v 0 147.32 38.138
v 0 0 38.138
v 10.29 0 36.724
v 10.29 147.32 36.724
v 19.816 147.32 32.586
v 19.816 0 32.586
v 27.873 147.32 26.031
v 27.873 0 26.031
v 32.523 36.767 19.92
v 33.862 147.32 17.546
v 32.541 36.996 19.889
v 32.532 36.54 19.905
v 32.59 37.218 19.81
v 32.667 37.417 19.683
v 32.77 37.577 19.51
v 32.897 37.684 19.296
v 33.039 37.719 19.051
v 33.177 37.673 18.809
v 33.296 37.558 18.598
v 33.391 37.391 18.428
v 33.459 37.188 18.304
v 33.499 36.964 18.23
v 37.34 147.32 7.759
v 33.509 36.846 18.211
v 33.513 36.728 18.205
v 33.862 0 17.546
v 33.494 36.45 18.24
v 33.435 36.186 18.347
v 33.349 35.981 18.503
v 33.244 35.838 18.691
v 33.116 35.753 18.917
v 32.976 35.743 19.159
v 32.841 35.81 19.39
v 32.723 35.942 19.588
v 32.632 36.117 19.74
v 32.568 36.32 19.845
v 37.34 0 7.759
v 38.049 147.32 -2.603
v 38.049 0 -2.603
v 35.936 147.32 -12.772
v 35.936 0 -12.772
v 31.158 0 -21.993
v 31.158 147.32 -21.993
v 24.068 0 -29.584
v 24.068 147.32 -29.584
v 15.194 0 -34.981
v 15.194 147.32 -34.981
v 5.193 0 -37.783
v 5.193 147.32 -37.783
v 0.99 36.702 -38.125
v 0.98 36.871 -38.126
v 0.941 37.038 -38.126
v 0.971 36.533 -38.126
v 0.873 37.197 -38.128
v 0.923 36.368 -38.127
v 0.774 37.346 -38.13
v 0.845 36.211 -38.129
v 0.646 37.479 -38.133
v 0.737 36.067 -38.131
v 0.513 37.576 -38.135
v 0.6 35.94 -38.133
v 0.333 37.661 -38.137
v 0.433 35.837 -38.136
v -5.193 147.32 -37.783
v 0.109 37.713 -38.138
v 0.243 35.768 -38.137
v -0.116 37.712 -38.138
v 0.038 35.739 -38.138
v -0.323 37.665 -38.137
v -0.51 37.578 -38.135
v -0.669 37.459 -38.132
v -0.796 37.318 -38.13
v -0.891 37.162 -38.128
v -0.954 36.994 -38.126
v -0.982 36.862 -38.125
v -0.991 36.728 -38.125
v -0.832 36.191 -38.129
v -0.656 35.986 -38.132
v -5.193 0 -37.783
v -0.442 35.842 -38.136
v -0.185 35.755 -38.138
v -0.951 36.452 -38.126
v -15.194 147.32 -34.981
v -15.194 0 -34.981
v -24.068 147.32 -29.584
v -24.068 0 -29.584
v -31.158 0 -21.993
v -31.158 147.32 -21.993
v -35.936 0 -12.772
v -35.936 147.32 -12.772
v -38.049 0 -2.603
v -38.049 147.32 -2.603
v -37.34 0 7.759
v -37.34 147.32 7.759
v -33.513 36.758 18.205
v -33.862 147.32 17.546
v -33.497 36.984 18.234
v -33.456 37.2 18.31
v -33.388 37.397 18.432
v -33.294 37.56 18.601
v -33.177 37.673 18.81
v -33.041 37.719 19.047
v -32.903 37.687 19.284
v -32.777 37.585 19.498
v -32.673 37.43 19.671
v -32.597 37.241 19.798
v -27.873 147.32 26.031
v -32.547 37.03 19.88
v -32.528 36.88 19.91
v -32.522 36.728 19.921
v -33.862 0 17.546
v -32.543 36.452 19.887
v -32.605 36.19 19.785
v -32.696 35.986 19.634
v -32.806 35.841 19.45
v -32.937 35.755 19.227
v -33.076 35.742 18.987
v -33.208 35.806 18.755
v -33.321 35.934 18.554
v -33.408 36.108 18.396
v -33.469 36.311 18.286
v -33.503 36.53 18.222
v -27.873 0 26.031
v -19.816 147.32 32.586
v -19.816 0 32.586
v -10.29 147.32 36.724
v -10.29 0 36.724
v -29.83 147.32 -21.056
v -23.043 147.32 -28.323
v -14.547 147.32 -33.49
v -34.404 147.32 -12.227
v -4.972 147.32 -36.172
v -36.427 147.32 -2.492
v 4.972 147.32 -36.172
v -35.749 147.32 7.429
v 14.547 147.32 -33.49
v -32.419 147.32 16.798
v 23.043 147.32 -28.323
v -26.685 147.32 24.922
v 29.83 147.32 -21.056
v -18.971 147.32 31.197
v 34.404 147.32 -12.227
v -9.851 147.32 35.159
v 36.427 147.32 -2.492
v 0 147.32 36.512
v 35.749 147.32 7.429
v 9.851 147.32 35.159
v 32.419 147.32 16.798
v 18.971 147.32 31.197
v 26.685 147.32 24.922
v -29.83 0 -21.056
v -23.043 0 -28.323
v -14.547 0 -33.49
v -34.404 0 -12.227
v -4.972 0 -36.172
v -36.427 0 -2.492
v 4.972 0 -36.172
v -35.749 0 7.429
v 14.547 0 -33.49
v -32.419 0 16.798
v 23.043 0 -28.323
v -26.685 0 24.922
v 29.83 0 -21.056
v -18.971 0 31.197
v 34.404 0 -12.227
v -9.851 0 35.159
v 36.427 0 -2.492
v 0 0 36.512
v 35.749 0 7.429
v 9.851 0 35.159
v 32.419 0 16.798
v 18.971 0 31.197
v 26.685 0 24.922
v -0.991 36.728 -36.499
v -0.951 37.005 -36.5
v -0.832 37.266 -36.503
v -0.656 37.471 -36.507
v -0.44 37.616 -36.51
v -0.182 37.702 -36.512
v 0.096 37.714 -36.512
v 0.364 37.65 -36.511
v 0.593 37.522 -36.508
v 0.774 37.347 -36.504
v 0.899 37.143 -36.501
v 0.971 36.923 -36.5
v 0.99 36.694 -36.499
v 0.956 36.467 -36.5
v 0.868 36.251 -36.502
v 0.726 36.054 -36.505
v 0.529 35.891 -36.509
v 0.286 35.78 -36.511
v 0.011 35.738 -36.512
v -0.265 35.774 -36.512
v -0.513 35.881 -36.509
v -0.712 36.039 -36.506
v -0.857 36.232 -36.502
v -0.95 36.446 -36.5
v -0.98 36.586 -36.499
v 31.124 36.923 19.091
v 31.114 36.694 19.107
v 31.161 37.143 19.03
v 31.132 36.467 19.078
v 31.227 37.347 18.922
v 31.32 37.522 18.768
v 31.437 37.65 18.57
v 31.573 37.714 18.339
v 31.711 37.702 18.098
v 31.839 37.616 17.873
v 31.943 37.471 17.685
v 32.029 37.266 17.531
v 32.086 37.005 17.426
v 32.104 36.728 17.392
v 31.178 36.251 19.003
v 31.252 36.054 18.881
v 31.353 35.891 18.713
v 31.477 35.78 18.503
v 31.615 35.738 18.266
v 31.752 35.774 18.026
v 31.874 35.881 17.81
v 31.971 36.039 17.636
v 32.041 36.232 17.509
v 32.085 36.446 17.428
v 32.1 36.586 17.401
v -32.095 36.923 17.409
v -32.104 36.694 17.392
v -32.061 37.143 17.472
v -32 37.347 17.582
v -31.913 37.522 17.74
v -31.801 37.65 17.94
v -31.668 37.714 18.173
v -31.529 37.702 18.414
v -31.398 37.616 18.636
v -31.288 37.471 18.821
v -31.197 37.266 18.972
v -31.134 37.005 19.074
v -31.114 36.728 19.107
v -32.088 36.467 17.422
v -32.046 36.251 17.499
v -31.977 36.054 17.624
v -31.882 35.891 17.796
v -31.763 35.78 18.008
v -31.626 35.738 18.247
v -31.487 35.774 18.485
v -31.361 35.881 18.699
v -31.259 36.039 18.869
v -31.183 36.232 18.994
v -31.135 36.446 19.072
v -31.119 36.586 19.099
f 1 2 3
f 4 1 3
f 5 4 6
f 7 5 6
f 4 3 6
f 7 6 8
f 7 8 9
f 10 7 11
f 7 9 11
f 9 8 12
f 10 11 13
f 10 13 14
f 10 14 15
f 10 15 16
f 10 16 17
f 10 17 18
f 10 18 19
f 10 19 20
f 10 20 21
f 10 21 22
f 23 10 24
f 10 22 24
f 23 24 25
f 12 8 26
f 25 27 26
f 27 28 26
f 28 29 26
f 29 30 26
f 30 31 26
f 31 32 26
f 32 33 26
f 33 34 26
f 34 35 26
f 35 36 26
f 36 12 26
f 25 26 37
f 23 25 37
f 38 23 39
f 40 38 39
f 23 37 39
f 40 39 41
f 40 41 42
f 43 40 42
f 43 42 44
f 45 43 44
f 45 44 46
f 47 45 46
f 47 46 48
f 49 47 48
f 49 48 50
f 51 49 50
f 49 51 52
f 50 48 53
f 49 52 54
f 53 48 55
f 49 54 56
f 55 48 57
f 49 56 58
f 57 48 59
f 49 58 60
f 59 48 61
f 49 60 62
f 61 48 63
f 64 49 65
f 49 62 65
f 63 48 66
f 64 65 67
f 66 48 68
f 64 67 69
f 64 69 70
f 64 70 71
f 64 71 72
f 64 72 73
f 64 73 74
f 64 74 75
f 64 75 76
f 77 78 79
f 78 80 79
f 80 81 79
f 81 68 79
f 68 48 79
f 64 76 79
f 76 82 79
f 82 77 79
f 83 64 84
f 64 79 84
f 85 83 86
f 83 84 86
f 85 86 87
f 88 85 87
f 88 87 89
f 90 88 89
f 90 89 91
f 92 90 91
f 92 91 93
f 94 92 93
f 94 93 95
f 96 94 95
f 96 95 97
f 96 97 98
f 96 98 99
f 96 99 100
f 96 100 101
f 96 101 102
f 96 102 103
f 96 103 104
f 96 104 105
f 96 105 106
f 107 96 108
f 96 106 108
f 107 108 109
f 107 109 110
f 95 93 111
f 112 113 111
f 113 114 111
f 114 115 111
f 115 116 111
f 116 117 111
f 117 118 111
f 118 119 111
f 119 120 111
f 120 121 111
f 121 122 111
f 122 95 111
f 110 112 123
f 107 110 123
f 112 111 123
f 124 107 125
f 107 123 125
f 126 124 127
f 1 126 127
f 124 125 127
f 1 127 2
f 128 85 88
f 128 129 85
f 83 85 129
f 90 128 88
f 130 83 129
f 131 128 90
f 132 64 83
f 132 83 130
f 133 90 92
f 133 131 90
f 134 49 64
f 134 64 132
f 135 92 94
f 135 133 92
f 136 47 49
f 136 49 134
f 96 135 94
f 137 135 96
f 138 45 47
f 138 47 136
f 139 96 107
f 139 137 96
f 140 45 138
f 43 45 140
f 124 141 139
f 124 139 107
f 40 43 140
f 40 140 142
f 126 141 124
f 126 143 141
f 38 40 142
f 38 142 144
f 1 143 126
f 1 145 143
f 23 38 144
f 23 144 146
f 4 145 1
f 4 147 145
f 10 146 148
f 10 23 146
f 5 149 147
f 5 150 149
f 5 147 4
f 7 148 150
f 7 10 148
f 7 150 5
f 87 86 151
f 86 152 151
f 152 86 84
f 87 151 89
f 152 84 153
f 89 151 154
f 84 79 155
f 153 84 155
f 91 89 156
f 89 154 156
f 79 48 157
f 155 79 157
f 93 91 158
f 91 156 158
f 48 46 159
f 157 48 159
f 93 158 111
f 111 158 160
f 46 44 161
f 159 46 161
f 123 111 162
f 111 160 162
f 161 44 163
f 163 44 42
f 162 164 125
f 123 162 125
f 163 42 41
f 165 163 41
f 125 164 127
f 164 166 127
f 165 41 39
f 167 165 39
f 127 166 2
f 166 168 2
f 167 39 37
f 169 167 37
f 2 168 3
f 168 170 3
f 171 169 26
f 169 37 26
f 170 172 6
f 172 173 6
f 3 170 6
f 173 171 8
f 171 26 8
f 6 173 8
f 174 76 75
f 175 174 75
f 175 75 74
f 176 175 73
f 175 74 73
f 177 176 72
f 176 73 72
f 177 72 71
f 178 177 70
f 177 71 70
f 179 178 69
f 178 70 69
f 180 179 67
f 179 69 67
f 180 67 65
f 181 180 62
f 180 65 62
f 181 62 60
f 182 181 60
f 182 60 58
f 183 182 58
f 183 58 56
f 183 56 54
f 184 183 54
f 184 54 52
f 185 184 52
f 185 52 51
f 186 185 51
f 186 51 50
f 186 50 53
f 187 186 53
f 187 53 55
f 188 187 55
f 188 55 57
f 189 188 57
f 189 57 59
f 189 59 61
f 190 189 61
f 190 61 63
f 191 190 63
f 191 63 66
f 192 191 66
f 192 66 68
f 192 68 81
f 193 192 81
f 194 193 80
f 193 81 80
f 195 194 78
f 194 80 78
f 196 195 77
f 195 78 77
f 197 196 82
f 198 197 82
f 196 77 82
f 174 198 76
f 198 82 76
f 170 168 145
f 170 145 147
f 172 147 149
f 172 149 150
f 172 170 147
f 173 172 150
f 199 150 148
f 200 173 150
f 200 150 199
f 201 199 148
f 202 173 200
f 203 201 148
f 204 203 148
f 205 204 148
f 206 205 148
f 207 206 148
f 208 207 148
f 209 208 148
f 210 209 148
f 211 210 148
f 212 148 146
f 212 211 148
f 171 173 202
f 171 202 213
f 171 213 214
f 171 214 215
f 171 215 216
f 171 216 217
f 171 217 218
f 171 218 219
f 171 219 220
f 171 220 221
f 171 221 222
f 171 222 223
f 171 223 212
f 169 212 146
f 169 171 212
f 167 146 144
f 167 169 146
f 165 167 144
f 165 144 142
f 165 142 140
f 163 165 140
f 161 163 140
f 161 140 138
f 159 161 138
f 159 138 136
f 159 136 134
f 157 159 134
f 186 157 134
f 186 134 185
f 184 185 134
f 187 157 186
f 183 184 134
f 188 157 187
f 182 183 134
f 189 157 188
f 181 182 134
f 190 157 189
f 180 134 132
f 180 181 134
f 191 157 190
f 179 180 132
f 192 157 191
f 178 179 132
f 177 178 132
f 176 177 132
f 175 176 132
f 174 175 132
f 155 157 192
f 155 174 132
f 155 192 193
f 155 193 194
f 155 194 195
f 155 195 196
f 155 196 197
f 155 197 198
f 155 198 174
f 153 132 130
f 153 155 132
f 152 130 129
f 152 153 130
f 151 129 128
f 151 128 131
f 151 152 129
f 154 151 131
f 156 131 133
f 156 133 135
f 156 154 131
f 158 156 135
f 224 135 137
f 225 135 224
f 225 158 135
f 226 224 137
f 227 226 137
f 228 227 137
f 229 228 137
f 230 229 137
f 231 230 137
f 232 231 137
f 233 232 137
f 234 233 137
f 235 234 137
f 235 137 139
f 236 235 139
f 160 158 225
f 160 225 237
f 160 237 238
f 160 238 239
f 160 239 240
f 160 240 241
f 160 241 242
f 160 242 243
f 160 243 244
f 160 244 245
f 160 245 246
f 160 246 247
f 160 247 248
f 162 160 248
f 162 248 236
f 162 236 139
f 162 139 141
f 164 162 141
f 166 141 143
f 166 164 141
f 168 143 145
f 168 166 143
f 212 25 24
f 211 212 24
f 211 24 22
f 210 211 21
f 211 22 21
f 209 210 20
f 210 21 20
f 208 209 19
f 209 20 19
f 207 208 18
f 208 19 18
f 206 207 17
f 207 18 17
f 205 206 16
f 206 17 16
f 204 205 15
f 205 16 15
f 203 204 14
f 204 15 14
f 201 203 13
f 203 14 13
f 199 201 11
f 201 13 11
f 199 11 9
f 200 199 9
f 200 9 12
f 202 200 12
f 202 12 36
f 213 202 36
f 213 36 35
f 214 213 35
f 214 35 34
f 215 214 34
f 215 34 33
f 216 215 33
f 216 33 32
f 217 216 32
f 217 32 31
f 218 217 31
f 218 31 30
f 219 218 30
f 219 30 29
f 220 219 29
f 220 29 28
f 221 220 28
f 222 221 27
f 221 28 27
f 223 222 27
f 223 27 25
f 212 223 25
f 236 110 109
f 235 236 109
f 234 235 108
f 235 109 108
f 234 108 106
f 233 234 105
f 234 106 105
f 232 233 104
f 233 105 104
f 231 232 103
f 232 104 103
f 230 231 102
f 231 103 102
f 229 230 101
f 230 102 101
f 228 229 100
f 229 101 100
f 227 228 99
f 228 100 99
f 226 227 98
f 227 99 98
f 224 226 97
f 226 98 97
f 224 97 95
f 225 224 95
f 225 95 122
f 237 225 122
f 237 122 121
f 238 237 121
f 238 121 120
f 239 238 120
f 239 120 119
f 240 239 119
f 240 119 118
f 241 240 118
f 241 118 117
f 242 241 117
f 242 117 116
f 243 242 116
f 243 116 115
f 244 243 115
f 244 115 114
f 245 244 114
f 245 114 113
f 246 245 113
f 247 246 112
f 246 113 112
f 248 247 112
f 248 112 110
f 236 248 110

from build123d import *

# Parameters (mm, degrees)
SKETCH1_R                = 38.1381
SKETCH1_R_2              = 36.5125
BOSS_EXTRUDE1_DEPTH      = 147.32
SHEAR_PIN_CUT_REACH      = 175.322
SHEAR_PIN_CUT_END_RADIUS = 36.5125
SKETCH2_R                = 0.9906
SHEAR_PIN_PATTERN_COUNT  = 3


with BuildPart() as part:
    # Sketch1 → Boss-Extrude1 (new body)
    with BuildSketch(Plane(origin=(0, 0, 0), x_dir=(1, 0, 0), z_dir=(0, 1, 0))):
        with Locations(Location((0, 0, 0), (0, 0, 270))):
            Circle(SKETCH1_R)
        with Locations(Location((0, 0, 0), (0, 0, 270))):
            Circle(SKETCH1_R_2, mode=Mode.SUBTRACT)
    extrude(amount=BOSS_EXTRUDE1_DEPTH)

    # Shear Pin Cut: up to this cylinder (the profile starts outside it)
    shear_pin_cut_end = Plane(origin=(0, 36.7284, 0), z_dir=(0, -1, 0)) * Cylinder(SHEAR_PIN_CUT_END_RADIUS, 424.669, mode=Mode.PRIVATE)
    # Sketch2 → Shear Pin Cut (cut, up to the surface)
    with BuildSketch(Plane(origin=(33.028563452, 0, 19.06905), x_dir=(0, -1, 0), z_dir=(0.866025403784438, 0, 0.500000000000001)), mode=Mode.PRIVATE) as shear_pin_cut_sk1:
        with Locations(Location((-36.7284, 0, 0), (0, 0, 90))):
            Circle(SKETCH2_R)
    shear_pin_cut_tool1 = extrude(shear_pin_cut_sk1.sketch, amount=-SHEAR_PIN_CUT_REACH, mode=Mode.PRIVATE) - shear_pin_cut_end
    shear_pin_cut = shear_pin_cut_tool1.solids().sort_by_distance((33.028563, 36.7284, 19.06905))[0]
    add(shear_pin_cut, mode=Mode.SUBTRACT)

    # Shear Pin Pattern: Shear Pin Cut ×3 about axis
    shear_pin_pattern_axis = Axis((0, 155.08605, 0), (0, -1, 0))
    for i in range(1, SHEAR_PIN_PATTERN_COUNT):
        add(shear_pin_cut.rotate(shear_pin_pattern_axis, i * 360 / SHEAR_PIN_PATTERN_COUNT), mode=Mode.SUBTRACT)


solid = part.part
